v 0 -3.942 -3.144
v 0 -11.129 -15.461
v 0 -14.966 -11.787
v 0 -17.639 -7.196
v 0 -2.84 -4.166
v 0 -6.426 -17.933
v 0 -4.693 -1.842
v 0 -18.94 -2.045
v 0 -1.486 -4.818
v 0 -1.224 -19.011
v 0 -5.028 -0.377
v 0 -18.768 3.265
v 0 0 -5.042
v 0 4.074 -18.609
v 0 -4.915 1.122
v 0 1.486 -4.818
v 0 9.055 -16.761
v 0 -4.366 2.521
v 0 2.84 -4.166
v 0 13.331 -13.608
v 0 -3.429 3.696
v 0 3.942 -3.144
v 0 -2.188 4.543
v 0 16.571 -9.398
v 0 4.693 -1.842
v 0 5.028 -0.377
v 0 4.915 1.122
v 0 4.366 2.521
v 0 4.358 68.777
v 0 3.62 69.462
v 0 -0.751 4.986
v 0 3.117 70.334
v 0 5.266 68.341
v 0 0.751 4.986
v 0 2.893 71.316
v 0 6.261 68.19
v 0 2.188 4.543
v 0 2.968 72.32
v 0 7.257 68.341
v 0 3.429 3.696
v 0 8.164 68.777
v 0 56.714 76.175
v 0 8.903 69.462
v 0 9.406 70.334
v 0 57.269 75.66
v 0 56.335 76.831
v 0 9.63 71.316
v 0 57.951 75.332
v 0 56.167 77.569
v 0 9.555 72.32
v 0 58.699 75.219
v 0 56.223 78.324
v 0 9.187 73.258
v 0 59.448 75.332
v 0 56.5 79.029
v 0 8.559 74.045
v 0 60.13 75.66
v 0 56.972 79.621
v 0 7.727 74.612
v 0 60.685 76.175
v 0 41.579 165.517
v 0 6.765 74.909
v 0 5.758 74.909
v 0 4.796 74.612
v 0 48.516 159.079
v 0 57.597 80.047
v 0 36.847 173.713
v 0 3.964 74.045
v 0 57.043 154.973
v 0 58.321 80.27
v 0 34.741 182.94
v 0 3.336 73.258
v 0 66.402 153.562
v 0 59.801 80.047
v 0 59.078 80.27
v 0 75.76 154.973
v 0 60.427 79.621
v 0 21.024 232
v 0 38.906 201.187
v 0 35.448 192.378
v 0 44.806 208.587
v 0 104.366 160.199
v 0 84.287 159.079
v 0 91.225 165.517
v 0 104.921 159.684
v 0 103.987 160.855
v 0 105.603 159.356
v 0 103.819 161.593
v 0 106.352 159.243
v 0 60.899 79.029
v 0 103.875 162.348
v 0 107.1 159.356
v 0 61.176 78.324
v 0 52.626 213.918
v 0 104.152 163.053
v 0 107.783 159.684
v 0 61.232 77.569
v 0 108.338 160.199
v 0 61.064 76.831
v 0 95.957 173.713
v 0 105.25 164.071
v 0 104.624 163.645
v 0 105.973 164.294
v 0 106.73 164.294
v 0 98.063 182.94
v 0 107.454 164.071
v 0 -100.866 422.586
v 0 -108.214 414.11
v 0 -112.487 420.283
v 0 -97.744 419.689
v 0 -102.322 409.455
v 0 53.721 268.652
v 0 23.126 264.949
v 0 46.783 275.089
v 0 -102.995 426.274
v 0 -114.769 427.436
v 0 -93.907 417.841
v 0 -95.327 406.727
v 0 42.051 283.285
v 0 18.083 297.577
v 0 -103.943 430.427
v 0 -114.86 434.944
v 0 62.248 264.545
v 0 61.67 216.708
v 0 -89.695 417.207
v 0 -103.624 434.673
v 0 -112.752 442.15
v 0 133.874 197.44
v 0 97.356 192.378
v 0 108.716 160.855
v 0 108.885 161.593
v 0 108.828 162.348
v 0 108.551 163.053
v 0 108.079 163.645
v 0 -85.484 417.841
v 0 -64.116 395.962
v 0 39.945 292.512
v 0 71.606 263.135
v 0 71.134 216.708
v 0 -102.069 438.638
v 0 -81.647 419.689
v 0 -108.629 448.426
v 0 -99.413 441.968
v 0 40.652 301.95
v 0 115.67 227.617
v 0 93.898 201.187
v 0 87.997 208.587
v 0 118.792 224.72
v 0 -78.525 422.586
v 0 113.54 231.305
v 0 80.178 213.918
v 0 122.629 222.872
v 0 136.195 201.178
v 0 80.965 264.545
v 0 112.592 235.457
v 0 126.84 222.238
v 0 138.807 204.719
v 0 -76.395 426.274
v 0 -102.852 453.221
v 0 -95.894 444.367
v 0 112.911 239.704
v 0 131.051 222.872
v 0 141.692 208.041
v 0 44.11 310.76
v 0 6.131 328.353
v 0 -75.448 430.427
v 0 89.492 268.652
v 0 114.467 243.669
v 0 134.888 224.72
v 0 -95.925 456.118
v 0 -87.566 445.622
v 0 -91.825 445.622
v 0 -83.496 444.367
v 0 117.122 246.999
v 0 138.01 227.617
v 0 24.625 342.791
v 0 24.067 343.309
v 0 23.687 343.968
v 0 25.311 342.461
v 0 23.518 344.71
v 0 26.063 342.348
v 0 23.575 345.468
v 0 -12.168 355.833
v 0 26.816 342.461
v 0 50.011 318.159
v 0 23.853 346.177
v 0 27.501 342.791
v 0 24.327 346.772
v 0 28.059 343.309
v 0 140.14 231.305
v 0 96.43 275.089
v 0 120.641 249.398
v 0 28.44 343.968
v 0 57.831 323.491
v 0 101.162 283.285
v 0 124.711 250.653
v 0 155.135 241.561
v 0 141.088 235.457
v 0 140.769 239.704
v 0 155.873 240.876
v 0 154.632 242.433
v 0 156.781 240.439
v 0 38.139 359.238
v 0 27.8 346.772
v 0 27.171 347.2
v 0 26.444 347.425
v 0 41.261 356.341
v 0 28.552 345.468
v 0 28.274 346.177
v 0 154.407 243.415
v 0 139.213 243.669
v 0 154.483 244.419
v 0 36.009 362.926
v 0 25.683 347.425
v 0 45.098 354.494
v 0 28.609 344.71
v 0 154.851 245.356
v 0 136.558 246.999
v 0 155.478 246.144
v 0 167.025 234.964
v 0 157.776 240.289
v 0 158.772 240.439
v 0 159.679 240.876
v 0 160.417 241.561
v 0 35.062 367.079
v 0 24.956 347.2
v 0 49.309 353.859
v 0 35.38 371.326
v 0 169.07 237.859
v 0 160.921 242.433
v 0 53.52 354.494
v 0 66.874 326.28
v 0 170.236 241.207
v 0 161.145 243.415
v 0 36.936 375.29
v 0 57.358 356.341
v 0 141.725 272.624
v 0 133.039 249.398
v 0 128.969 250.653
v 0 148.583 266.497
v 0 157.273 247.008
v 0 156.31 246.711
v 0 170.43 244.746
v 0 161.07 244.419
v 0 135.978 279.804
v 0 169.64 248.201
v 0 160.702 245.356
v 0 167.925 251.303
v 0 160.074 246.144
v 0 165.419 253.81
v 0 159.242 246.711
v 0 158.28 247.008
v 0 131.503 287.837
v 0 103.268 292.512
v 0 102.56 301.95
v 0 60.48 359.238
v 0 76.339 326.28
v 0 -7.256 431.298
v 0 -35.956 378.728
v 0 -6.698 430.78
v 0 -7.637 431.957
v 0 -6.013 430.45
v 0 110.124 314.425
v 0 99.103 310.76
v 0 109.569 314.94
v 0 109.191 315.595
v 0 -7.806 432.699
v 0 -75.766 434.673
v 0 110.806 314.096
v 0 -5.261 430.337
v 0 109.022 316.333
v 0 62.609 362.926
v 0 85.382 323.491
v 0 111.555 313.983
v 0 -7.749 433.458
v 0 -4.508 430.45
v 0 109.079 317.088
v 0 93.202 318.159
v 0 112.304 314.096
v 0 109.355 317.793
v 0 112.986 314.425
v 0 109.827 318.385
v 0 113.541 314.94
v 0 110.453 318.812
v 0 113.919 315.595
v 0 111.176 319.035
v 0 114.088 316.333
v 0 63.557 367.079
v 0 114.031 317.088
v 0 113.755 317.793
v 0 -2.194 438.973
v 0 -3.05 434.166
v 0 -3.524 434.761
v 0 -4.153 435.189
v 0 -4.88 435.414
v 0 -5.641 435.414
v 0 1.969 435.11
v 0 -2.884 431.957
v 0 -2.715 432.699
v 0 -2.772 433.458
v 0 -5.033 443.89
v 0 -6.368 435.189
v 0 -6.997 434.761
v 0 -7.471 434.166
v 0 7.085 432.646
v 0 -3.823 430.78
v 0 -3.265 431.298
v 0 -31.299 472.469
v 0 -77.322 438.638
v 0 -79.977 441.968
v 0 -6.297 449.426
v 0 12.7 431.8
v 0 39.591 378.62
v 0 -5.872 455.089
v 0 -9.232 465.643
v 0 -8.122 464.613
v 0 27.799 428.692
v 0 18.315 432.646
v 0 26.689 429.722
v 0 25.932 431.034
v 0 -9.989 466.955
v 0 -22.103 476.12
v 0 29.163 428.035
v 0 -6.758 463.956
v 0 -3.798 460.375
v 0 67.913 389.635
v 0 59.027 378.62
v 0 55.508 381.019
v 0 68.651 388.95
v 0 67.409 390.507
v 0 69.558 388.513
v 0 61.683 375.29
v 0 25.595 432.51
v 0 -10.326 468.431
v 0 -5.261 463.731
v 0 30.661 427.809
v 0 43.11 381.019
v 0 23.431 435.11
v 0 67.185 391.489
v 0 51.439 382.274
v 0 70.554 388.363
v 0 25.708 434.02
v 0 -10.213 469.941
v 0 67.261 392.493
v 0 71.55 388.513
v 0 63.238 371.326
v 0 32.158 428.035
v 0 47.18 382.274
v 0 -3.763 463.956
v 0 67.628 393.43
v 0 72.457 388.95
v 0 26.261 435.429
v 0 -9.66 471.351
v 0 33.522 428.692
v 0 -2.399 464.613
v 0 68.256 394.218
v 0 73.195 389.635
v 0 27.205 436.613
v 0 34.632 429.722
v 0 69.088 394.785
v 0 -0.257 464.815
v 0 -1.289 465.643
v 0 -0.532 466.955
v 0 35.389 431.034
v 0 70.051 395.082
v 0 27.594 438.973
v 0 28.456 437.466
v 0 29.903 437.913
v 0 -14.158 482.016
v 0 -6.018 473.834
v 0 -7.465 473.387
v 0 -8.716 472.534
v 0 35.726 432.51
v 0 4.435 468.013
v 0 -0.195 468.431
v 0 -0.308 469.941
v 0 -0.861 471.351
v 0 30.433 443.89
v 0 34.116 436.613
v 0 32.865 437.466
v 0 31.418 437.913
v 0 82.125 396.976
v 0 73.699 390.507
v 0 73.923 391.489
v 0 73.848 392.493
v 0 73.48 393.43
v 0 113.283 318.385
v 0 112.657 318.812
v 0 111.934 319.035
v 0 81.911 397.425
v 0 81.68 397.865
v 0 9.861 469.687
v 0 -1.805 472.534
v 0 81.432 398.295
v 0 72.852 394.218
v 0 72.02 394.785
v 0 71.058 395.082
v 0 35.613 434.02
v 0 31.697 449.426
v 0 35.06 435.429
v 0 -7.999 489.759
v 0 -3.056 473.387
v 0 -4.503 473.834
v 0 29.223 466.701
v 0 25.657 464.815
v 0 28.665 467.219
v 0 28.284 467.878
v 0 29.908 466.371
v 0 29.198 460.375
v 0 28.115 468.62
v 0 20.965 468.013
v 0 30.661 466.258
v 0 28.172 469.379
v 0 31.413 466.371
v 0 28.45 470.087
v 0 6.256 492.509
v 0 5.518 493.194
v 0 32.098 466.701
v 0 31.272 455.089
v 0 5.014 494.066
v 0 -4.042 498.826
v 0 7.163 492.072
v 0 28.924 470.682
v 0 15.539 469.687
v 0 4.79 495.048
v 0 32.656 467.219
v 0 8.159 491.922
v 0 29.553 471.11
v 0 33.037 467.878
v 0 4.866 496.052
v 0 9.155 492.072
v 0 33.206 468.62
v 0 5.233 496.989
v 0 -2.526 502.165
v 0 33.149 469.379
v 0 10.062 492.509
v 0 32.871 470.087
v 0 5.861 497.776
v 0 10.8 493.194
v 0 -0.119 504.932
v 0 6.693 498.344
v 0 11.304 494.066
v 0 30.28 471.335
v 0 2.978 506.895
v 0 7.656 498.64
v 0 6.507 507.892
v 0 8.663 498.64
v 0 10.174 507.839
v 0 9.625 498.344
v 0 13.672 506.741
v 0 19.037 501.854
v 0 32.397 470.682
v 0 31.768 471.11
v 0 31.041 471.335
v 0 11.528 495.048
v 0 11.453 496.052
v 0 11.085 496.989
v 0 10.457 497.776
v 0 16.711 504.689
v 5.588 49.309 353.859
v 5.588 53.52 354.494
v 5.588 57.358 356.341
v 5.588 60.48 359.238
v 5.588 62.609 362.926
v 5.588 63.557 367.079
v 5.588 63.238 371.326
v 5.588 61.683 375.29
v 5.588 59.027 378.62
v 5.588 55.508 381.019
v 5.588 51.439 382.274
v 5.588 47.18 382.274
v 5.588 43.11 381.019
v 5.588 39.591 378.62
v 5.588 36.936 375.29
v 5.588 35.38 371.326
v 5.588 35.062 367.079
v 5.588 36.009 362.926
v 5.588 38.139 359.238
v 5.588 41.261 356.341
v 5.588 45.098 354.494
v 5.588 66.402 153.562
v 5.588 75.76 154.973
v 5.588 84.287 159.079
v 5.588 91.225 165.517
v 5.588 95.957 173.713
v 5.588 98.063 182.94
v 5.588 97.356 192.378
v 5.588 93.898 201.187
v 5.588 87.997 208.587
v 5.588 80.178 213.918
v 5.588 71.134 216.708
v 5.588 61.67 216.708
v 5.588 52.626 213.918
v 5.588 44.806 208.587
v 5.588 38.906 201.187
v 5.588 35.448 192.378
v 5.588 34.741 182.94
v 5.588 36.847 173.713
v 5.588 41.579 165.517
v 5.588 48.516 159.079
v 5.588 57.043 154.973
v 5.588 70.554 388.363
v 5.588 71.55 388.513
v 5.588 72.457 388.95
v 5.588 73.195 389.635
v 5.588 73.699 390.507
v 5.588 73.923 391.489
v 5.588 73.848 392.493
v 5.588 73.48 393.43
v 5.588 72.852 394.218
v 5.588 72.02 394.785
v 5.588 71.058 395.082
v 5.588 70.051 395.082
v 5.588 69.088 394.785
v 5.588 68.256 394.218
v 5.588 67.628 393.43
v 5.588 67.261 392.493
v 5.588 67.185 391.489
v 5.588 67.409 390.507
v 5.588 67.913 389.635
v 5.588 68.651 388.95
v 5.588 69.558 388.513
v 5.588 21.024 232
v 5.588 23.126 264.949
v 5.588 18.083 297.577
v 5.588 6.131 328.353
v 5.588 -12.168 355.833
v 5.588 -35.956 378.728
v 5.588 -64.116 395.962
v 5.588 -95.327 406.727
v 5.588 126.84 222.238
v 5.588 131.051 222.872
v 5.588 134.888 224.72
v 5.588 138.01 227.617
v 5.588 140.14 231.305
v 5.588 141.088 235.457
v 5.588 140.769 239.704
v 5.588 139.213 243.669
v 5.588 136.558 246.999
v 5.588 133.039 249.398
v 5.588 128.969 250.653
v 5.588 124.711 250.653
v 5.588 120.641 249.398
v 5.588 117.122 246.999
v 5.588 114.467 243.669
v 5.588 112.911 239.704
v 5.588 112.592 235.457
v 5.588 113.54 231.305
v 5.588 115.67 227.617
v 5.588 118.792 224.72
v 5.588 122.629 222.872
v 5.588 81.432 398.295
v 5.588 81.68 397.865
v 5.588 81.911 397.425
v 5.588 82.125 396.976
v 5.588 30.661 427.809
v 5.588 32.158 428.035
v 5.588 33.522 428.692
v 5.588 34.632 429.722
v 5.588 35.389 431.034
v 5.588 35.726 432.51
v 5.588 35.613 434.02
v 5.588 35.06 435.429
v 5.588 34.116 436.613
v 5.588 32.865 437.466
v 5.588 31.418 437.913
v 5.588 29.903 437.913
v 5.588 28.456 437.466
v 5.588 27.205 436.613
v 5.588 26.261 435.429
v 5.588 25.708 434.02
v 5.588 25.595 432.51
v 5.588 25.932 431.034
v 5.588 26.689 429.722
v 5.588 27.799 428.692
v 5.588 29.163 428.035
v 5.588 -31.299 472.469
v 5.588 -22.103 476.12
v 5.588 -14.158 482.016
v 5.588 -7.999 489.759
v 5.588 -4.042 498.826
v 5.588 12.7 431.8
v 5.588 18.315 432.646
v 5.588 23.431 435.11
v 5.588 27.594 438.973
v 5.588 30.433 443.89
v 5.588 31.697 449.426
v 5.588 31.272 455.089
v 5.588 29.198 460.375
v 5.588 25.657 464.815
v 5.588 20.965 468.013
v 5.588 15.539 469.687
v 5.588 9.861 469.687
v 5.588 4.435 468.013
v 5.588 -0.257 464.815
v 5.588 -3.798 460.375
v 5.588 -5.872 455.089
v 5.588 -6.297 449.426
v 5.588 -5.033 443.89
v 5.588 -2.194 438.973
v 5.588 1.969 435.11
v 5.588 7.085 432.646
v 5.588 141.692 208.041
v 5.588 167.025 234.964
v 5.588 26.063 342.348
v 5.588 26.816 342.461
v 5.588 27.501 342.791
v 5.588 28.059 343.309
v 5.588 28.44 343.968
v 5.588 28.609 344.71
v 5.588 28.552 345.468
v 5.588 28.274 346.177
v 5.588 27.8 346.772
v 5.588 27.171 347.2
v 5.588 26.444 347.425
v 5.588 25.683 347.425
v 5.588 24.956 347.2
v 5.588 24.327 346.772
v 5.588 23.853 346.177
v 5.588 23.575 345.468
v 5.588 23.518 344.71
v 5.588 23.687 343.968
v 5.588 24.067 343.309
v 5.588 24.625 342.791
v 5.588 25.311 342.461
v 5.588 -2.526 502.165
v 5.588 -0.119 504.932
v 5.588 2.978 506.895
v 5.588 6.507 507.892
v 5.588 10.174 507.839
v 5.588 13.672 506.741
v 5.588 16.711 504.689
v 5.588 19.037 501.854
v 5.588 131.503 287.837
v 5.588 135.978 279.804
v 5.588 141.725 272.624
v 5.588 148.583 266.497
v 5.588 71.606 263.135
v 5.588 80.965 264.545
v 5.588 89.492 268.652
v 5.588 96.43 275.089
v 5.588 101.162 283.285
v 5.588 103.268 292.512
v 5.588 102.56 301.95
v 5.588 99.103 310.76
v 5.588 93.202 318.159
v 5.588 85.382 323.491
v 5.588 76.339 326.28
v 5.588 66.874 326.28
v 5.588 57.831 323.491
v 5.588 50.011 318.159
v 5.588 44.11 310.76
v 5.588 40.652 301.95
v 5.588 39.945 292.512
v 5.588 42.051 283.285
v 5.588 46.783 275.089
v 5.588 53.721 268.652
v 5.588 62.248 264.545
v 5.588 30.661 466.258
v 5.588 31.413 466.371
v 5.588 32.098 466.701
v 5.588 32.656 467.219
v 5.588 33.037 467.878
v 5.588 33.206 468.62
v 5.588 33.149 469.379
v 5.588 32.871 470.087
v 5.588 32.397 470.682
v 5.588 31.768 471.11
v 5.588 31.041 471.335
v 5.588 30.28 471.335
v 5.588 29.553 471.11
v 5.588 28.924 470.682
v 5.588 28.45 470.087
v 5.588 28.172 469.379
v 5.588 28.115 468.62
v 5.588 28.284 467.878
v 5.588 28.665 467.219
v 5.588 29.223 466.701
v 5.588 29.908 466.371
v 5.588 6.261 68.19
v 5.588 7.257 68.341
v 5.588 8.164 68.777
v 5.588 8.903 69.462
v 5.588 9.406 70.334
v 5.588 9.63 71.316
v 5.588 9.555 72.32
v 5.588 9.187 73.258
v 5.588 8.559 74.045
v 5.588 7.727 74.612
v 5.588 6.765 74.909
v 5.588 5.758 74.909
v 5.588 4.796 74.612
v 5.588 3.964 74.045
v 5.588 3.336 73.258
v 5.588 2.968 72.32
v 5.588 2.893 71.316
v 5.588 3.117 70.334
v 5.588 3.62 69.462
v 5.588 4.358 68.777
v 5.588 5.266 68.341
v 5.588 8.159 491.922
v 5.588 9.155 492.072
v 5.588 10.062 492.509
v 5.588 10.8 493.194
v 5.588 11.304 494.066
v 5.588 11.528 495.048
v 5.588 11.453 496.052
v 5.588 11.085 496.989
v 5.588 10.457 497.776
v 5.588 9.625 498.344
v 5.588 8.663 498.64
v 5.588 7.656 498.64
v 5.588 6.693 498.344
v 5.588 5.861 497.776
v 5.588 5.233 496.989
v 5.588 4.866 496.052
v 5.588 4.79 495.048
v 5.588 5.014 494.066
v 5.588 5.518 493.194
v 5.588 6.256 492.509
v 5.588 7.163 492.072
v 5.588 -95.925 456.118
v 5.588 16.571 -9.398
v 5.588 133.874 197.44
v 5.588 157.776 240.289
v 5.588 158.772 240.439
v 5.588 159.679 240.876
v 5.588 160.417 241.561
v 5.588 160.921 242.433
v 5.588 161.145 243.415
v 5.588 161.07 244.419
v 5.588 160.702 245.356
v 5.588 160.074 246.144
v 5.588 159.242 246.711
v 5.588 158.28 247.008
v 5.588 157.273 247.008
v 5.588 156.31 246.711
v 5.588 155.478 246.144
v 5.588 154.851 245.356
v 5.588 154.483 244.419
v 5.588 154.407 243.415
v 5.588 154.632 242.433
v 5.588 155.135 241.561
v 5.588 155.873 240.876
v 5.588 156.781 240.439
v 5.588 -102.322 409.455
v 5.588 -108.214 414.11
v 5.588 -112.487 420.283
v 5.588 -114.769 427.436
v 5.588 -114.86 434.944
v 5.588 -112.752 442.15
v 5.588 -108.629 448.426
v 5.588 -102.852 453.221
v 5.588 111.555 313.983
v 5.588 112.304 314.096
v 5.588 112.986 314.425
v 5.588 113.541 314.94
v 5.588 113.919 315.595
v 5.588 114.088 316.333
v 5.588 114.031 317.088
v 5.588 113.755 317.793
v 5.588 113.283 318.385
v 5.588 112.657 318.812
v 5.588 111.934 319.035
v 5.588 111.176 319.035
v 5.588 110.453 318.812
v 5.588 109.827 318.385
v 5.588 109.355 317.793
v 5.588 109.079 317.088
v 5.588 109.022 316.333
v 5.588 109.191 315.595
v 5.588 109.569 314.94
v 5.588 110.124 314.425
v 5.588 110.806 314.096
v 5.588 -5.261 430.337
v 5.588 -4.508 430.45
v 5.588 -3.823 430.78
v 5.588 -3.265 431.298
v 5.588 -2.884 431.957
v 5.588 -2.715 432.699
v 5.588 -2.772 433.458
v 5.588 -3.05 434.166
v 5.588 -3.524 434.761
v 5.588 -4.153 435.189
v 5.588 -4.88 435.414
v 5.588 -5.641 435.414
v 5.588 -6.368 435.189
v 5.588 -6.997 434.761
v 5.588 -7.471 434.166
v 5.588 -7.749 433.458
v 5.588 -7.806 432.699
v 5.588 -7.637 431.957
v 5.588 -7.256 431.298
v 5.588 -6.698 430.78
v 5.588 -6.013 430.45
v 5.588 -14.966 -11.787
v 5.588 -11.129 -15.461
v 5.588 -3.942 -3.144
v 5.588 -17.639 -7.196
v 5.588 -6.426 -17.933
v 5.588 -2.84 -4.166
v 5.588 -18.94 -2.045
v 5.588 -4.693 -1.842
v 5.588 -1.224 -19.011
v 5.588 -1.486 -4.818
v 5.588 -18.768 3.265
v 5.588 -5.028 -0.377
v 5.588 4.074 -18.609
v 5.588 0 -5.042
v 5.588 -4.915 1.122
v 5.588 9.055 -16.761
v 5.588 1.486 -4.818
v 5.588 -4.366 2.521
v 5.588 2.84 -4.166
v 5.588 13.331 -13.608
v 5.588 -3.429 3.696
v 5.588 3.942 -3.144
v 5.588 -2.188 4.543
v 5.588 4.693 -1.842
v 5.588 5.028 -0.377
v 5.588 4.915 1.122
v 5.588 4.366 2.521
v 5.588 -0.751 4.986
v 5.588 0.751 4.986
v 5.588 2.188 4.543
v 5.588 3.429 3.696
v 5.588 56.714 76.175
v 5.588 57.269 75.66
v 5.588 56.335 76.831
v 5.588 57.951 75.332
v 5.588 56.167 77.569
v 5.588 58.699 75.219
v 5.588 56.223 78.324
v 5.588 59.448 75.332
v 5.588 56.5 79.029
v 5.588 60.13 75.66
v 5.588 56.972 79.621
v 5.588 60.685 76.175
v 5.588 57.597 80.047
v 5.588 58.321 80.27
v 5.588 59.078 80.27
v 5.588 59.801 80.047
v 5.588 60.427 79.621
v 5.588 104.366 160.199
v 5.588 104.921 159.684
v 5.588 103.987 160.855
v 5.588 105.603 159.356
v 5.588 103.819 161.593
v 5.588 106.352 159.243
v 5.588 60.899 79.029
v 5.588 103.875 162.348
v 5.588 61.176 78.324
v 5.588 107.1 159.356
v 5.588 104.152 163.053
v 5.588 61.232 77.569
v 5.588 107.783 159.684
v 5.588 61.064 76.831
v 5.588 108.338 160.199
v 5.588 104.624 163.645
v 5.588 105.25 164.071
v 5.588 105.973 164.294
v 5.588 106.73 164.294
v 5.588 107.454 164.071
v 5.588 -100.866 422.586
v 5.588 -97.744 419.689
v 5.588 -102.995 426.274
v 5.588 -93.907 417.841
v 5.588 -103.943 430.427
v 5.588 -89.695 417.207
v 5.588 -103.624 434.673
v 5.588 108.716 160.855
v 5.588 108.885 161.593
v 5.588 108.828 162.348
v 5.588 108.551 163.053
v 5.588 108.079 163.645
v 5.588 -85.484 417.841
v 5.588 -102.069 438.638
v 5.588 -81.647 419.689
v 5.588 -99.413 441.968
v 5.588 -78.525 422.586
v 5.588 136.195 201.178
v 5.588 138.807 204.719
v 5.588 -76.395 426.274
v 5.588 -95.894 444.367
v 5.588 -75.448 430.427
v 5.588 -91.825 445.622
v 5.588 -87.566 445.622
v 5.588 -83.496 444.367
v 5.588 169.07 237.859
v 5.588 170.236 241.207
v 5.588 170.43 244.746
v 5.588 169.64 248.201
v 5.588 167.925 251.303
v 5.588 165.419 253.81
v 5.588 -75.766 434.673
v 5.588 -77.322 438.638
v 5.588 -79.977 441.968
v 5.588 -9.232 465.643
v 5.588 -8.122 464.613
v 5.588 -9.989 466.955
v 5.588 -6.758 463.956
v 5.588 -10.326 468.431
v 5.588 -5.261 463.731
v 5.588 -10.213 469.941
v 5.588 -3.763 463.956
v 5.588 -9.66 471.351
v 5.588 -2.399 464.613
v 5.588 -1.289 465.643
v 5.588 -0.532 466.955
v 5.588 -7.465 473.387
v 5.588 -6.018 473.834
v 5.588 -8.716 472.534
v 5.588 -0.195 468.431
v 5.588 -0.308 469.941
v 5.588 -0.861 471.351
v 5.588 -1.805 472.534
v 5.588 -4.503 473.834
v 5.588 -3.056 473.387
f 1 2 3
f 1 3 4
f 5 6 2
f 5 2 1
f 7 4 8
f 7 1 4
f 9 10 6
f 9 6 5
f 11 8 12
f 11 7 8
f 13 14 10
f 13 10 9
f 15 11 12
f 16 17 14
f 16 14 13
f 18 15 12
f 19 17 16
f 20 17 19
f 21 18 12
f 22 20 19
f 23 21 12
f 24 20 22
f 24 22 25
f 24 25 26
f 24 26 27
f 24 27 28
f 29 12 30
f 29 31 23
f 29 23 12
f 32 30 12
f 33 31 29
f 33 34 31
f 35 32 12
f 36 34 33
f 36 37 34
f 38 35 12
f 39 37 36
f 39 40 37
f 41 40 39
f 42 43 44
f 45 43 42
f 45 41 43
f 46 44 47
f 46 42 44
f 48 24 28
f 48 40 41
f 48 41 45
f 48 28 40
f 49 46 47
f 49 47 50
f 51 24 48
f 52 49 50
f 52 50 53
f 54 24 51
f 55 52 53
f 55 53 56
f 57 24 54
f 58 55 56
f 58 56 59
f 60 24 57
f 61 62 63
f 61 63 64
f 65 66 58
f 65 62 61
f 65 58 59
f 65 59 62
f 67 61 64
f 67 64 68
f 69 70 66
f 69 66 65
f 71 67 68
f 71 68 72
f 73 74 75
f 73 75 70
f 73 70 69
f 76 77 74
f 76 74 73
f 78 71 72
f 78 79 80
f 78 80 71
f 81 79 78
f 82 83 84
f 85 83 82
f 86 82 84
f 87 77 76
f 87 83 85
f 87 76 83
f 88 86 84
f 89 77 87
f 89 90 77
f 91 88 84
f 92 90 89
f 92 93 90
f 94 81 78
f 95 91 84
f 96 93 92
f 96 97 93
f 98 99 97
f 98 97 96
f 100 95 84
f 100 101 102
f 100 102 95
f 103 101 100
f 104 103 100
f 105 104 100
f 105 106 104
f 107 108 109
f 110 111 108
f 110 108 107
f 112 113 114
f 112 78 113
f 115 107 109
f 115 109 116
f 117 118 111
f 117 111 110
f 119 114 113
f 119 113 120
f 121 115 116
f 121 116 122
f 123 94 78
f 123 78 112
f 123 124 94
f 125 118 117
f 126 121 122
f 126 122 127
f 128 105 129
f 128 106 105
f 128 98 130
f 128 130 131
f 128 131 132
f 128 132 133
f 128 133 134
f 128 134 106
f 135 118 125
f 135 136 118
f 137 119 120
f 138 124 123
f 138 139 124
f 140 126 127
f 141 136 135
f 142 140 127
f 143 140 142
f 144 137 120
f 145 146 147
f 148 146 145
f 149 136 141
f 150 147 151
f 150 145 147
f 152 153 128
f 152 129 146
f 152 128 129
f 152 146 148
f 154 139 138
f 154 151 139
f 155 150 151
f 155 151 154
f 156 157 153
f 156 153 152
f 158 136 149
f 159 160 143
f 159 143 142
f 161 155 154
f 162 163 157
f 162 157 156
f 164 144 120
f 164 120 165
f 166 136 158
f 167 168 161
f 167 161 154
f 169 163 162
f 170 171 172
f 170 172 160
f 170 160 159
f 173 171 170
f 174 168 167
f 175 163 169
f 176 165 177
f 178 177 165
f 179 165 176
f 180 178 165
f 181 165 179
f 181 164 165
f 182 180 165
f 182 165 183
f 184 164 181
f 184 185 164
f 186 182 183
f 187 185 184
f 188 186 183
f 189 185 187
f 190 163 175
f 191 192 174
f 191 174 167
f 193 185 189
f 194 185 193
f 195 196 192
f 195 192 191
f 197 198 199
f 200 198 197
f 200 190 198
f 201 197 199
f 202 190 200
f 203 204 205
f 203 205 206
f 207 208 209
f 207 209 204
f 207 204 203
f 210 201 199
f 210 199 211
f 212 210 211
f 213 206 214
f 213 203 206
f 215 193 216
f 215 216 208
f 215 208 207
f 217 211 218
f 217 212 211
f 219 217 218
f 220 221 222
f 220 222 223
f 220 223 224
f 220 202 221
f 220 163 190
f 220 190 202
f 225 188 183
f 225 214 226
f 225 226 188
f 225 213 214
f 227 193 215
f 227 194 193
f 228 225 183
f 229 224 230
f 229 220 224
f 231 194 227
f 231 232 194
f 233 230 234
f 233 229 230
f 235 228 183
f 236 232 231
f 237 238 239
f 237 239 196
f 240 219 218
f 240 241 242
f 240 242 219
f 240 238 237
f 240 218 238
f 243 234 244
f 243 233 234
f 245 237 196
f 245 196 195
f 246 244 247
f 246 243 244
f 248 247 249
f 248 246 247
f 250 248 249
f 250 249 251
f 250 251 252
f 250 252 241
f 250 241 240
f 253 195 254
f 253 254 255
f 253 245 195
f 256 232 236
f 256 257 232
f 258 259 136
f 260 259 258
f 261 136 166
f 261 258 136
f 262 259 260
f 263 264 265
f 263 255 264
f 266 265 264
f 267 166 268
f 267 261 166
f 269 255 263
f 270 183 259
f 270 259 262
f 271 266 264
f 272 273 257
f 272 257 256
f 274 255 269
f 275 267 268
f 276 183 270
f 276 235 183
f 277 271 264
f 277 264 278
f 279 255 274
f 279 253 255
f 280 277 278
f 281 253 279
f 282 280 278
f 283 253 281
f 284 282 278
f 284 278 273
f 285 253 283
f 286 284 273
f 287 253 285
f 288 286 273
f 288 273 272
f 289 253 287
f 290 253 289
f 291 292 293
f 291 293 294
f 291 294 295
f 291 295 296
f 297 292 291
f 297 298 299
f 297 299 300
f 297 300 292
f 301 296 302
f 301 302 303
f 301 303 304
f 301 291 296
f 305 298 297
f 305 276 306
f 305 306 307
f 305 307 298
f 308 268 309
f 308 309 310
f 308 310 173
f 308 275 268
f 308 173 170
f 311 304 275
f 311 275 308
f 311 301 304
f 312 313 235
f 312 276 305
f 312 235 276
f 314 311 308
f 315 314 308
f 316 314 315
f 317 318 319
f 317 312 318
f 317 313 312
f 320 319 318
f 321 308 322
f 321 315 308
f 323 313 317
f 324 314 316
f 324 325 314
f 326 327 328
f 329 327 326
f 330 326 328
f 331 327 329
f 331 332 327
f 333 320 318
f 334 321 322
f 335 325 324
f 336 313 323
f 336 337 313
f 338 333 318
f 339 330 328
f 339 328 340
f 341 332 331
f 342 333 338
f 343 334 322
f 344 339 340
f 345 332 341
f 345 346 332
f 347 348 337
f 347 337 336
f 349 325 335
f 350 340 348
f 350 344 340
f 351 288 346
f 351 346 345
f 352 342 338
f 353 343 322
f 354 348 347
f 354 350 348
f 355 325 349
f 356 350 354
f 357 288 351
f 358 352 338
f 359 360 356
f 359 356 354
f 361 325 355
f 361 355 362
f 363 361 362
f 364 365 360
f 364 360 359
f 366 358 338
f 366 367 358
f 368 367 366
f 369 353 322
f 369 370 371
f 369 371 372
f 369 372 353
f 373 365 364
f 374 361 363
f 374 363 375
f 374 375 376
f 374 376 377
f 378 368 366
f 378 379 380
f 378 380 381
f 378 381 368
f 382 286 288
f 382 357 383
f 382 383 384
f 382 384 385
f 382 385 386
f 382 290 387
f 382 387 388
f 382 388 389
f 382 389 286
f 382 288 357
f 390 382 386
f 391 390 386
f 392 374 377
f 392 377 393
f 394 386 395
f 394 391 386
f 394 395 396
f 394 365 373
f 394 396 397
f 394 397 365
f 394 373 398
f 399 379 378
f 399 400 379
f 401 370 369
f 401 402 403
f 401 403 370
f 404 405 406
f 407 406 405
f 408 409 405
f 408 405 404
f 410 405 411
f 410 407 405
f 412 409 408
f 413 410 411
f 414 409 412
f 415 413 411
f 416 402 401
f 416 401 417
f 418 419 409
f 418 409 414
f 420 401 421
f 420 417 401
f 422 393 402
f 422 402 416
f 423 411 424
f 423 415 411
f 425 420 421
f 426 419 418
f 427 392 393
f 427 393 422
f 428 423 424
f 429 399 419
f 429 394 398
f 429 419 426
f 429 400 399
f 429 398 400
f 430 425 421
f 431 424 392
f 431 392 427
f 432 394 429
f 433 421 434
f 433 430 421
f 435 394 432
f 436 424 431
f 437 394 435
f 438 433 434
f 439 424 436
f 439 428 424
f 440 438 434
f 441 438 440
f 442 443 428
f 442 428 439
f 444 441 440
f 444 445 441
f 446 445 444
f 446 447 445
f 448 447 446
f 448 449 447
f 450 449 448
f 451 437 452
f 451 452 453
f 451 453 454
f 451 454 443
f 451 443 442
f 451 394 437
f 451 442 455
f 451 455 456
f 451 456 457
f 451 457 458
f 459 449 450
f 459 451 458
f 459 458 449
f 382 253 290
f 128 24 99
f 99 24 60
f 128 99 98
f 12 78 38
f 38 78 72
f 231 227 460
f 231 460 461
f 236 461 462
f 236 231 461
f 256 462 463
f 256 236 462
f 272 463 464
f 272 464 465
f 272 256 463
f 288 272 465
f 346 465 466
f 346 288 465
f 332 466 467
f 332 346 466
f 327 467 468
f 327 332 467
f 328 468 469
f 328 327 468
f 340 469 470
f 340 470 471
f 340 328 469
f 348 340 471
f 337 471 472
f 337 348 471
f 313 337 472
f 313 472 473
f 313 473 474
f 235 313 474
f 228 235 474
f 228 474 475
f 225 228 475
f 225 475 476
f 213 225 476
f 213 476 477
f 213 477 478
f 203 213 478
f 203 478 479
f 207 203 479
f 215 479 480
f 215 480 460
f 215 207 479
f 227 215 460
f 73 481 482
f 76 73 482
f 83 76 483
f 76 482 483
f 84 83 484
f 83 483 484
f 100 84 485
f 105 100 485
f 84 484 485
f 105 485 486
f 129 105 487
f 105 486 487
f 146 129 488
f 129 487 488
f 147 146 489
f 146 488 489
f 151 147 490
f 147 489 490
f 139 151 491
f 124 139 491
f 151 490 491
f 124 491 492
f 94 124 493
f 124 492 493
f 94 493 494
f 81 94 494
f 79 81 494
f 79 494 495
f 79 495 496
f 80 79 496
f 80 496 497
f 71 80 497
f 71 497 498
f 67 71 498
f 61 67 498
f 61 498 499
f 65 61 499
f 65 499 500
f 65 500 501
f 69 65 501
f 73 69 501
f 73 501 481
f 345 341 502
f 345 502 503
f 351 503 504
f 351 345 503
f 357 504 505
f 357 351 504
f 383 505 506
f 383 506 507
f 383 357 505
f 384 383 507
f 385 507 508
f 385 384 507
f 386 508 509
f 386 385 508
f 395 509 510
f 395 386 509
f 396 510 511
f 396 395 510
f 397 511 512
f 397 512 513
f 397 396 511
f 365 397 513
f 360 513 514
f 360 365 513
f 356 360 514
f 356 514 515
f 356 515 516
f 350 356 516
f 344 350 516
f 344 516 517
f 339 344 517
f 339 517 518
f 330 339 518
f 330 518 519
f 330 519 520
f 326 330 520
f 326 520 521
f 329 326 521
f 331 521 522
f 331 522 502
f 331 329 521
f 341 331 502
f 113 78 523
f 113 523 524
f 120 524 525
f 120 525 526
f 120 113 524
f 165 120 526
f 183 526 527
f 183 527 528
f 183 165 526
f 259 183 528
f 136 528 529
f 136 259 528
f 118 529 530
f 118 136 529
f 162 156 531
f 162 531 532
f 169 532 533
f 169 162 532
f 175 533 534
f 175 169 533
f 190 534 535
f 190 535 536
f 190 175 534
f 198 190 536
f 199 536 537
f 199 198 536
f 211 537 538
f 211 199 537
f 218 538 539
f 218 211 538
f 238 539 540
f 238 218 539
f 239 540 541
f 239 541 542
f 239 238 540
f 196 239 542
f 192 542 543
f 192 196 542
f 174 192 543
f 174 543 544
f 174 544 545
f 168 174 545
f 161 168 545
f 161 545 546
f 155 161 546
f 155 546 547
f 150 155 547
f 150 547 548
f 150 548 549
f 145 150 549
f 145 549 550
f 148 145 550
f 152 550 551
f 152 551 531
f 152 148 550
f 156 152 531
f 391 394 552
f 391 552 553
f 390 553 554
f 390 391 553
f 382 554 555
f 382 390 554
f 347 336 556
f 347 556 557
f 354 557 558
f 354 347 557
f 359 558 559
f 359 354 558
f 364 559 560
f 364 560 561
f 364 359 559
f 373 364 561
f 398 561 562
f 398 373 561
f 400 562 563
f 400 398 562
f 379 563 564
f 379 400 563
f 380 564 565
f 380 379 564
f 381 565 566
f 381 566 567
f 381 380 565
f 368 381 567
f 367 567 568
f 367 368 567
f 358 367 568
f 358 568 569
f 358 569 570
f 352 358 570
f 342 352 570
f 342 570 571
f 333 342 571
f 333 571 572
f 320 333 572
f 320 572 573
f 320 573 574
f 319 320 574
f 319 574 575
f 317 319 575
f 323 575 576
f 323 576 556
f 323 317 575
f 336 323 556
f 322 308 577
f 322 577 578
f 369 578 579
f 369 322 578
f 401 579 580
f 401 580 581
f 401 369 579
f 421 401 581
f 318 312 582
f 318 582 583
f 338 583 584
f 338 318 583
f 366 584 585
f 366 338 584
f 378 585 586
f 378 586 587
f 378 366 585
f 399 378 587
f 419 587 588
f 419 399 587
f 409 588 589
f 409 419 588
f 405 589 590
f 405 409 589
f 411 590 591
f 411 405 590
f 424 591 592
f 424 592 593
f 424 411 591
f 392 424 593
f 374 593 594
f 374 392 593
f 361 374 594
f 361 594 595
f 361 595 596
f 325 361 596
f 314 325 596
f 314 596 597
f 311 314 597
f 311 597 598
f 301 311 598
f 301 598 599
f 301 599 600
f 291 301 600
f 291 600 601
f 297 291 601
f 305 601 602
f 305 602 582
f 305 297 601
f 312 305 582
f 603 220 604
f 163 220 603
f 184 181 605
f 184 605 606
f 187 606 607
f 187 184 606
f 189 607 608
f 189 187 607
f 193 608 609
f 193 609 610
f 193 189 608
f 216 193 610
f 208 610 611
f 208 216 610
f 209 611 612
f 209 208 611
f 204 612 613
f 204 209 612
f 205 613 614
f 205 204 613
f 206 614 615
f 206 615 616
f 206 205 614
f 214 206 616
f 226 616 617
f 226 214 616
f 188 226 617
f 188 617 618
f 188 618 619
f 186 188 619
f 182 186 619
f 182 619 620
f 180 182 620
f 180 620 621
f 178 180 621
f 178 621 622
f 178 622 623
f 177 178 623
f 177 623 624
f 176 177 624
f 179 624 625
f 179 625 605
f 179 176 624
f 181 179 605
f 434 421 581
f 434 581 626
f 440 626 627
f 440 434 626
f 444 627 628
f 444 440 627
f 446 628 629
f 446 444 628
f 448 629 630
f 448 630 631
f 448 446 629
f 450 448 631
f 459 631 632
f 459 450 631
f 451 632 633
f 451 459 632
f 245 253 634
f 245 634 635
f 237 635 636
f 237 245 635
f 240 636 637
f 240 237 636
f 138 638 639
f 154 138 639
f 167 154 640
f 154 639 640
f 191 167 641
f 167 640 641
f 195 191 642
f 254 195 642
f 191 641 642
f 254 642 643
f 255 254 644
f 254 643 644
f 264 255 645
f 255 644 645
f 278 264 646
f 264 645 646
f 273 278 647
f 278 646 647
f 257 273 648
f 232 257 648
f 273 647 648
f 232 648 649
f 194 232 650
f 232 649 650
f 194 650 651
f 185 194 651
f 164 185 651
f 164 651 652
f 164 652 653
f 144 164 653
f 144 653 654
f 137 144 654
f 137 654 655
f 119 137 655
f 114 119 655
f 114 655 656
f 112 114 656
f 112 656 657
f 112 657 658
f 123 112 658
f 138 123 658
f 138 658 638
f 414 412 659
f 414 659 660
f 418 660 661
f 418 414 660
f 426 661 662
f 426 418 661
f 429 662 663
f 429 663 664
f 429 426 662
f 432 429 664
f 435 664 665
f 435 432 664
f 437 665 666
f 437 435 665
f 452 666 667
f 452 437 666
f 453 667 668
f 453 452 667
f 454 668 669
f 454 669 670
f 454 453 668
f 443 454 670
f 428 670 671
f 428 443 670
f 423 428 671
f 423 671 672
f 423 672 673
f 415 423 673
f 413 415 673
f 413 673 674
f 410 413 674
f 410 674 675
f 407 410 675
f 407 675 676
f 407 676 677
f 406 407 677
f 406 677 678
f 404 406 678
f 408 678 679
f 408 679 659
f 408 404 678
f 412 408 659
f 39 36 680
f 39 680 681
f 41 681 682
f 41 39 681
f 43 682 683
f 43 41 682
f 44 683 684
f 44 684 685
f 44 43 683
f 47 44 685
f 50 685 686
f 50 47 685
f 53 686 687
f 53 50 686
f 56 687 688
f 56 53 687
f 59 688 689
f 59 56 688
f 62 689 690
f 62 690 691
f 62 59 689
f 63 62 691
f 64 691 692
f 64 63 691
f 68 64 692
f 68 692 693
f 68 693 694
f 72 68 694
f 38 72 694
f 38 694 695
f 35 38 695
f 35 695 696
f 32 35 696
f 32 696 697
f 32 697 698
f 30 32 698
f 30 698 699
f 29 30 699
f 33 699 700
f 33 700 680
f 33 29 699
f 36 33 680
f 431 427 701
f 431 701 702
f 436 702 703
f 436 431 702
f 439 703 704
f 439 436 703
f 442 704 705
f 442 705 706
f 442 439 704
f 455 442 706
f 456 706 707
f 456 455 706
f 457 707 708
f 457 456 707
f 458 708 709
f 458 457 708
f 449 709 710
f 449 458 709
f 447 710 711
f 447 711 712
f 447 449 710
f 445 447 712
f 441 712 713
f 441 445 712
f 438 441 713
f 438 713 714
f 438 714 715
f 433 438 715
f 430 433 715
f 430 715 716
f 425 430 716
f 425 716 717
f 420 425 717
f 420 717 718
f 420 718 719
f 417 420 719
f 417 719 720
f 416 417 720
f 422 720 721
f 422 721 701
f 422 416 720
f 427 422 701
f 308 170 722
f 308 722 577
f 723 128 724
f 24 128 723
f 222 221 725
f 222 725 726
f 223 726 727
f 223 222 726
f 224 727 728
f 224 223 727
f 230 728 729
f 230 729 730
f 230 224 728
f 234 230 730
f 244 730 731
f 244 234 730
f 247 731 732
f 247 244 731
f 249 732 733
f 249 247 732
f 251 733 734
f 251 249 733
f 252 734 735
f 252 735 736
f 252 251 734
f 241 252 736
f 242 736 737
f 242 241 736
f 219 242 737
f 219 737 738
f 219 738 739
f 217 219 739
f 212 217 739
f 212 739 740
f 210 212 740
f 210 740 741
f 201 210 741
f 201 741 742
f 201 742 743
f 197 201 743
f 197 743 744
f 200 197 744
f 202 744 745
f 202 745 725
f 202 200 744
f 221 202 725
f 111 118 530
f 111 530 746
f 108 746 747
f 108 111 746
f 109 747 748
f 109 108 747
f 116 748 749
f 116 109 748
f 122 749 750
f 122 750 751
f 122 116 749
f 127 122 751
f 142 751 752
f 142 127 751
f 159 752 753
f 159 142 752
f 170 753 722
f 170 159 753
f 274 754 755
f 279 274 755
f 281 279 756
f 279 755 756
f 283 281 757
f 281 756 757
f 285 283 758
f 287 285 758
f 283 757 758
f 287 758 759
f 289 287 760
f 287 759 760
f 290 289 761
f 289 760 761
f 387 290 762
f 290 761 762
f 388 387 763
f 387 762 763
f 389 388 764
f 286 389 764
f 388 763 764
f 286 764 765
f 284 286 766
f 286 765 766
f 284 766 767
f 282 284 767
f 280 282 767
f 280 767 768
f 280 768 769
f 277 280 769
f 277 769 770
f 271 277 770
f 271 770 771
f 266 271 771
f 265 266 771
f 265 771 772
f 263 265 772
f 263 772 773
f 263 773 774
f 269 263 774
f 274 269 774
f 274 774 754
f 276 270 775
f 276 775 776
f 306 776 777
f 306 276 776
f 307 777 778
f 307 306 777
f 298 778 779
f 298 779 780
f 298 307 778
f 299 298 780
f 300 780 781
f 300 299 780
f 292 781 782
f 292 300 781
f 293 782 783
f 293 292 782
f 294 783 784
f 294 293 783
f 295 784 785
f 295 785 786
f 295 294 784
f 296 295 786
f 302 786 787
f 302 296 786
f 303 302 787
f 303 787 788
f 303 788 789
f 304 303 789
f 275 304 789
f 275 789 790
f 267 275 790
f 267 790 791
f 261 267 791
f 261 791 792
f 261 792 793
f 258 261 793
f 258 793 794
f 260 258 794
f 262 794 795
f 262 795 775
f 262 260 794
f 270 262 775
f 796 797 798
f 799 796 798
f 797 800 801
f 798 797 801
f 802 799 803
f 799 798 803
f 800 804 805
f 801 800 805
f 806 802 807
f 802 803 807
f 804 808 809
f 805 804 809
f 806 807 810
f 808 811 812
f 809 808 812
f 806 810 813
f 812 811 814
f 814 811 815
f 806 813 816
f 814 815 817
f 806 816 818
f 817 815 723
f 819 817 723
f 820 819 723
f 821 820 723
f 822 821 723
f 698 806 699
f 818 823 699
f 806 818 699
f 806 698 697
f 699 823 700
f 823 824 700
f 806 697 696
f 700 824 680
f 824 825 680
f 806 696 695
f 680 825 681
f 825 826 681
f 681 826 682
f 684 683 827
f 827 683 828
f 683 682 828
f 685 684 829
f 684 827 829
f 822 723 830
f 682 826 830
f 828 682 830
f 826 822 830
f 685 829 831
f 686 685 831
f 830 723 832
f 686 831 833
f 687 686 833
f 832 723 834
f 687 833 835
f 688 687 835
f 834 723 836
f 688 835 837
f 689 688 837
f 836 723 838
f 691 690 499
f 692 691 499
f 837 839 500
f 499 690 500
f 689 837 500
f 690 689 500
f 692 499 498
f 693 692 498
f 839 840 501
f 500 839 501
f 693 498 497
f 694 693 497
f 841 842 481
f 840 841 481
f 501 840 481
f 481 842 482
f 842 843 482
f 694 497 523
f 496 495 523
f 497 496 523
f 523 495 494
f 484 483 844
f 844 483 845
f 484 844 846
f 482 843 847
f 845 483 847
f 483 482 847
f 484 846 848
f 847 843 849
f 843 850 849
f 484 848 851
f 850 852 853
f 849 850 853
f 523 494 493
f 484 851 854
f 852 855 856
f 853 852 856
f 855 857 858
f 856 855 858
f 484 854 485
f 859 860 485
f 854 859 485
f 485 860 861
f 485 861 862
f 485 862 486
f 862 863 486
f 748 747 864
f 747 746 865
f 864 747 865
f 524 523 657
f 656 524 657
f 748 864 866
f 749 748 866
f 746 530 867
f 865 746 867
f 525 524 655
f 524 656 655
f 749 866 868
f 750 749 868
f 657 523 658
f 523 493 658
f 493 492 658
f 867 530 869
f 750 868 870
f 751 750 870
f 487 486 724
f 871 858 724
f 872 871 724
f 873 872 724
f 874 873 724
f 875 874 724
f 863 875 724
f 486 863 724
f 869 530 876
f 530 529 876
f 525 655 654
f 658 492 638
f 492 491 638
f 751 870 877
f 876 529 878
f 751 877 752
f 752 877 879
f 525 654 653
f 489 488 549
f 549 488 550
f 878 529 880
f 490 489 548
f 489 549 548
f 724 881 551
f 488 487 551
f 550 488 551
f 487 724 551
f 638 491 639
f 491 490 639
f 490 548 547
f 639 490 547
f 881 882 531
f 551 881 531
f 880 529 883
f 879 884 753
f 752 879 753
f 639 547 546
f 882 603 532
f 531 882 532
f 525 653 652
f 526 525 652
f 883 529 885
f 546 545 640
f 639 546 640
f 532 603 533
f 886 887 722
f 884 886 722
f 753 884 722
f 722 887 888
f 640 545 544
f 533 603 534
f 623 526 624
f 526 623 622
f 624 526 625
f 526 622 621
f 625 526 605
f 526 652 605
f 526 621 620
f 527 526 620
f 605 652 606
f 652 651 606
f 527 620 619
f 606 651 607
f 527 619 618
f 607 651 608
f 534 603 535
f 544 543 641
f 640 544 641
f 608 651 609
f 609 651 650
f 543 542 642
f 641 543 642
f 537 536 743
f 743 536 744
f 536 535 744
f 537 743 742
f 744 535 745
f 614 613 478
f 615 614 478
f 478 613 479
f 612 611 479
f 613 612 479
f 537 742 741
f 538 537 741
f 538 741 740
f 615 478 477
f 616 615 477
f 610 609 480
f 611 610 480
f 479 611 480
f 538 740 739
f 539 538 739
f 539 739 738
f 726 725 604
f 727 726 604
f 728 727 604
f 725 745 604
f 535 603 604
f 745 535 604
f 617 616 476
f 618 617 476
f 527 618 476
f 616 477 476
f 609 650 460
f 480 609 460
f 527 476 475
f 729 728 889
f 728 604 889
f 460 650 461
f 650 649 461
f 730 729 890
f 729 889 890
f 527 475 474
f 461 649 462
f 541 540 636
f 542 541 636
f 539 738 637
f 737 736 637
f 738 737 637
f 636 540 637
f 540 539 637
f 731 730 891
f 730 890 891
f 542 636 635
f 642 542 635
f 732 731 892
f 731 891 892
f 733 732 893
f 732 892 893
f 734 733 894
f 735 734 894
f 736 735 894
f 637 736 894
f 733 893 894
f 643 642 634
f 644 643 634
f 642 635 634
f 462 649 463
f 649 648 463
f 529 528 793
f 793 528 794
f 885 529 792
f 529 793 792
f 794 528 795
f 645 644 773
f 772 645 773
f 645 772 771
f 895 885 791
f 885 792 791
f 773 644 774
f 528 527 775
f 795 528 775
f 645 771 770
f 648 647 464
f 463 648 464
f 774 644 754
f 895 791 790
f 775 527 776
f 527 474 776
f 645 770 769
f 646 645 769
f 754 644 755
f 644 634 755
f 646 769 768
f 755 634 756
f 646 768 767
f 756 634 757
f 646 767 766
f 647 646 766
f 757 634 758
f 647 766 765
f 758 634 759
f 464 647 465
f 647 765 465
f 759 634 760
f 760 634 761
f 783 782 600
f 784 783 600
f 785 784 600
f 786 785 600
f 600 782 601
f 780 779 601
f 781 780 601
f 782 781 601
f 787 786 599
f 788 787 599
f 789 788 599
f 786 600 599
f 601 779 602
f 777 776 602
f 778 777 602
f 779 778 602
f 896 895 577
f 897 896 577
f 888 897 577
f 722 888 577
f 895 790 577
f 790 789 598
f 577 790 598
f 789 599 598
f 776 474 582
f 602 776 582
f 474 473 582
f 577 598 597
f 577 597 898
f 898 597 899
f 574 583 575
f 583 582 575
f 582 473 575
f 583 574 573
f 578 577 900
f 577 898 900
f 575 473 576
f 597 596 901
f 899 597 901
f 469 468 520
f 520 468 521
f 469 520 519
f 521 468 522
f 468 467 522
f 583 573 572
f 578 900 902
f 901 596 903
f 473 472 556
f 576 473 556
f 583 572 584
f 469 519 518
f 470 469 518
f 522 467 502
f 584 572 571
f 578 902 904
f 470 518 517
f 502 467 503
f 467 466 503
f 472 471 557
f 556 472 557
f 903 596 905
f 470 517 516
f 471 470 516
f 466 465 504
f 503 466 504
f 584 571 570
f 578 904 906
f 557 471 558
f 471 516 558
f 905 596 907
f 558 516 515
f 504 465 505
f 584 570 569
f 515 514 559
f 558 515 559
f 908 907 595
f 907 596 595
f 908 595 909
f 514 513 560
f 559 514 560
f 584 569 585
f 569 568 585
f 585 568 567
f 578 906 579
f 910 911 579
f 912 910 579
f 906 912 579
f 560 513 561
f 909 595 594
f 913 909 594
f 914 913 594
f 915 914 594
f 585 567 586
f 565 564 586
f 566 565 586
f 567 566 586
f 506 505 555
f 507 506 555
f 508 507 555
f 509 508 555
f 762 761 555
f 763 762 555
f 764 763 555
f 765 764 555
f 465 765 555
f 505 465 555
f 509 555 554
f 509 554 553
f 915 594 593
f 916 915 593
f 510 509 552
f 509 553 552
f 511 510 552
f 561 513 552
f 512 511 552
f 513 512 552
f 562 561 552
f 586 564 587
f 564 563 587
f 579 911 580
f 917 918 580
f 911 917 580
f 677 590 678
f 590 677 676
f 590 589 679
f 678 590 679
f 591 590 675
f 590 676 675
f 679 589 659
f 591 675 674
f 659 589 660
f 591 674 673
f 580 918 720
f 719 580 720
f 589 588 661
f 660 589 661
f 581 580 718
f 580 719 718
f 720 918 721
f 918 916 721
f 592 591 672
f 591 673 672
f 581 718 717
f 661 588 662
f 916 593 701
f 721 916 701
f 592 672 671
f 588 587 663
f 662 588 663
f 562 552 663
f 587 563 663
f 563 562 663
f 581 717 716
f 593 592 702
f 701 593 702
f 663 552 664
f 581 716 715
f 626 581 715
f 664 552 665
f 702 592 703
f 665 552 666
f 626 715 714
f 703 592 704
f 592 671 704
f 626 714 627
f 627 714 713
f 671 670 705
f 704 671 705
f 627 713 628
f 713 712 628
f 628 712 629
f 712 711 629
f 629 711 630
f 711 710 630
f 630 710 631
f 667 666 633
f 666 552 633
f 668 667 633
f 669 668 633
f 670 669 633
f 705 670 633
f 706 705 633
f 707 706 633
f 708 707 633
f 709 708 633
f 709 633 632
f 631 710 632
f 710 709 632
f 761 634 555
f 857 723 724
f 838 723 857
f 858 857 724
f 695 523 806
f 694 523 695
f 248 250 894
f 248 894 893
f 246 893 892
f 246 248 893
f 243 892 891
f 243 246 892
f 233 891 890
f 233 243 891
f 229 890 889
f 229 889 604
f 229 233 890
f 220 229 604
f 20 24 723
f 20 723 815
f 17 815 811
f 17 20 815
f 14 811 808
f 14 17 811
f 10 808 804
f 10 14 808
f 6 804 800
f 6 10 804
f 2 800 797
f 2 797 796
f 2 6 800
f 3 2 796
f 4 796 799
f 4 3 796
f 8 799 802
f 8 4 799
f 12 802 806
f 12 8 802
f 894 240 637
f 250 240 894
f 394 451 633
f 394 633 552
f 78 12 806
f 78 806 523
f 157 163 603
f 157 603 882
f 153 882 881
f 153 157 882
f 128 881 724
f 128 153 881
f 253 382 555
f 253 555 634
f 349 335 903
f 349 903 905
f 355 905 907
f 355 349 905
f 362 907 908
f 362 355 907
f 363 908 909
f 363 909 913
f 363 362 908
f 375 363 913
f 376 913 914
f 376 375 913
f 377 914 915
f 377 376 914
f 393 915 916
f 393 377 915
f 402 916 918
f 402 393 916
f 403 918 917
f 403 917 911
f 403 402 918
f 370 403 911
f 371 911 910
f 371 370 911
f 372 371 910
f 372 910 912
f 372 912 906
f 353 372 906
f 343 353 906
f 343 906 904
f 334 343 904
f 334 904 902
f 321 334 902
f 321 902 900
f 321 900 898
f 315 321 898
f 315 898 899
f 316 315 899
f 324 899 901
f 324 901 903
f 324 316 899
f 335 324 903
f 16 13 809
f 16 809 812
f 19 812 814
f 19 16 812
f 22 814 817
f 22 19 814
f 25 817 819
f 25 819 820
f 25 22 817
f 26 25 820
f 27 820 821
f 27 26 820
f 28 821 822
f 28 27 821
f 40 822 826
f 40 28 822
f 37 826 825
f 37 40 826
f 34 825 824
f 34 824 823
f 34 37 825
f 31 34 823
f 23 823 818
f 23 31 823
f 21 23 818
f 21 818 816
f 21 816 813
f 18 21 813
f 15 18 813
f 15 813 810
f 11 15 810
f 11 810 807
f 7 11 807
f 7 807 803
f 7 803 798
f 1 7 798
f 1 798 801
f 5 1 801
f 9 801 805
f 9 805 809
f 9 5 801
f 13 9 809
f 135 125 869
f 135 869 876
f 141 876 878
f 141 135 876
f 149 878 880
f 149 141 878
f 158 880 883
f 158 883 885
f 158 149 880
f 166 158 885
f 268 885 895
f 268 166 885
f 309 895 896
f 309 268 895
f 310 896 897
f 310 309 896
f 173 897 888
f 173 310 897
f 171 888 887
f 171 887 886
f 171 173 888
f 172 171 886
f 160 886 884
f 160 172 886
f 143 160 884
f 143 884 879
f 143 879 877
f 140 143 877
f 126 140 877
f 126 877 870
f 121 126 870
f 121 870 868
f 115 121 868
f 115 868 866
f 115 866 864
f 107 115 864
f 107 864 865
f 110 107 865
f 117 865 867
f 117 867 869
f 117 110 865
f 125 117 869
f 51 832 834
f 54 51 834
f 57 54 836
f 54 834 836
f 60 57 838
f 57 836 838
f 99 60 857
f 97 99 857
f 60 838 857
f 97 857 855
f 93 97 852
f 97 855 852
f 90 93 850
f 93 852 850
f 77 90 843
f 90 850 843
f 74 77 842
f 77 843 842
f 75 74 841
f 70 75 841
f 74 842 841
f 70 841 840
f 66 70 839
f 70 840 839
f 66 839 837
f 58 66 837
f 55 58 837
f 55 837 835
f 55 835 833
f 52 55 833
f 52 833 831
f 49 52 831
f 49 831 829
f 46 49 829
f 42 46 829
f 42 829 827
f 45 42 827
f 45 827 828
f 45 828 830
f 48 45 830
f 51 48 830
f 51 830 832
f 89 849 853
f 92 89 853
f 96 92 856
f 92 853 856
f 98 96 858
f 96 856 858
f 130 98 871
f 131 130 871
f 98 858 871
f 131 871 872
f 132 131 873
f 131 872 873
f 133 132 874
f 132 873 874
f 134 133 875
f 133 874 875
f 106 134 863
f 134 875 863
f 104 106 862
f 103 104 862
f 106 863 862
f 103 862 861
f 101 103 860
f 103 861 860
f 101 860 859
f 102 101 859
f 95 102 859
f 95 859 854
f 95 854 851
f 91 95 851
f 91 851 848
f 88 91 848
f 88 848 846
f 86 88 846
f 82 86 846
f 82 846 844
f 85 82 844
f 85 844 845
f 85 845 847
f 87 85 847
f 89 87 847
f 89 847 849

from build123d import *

# Parameters (mm, degrees)
SKETCH2_R           = 14.2875
SKETCH2_R_2         = 19.05
SKETCH2_R_3         = 2.5527
SKETCH2_R_4         = 5.0419
SKETCH2_R_5         = 3.3782
SKETCH2_R_6         = 5.08
BOSS_EXTRUDE1_DEPTH = 5.588
SKETCH4_R           = 31.75
SKETCH4_R_2         = 2.54
CUT_EXTRUDE1_DEPTH  = 6.588


with BuildPart() as part:
    # Sketch2 → Boss-Extrude1 (new body)
    with BuildSketch(Plane(origin=(0, 0, 0), x_dir=(0, 0, -1), z_dir=(1, 0, 0))):
        with BuildLine():
            Line((-456.118369633, -95.925064686), (-472.468769944, -31.298651711))
            ThreePointArc((-472.468769944, -31.298651711), (-482.016027605, -14.158478394), (-498.826247655, -4.041553364))
            ThreePointArc((-498.826247655, -4.041553364), (-507.892088549, 6.507023908), (-501.854140922, 19.037193183))
            Line((-501.854140922, 19.037193183), (-398.295274803, 81.43217891))
            ThreePointArc((-398.295274803, 81.43217891), (-397.645900343, 81.797901654), (-396.976191421, 82.124903604))
            Line((-396.976191421, 82.124903604), (-287.837435211, 131.503170214))
            ThreePointArc((-287.837435211, 131.503170214), (-276.093947879, 138.70177912), (-266.497227284, 148.582690958))
            Line((-266.497227284, 148.582690958), (-253.809934756, 165.419296806))
            ThreePointArc((-253.809934756, 165.419296806), (-244.745753976, 170.430370198), (-234.964294435, 167.025479743))
            Line((-234.964294435, 167.025479743), (-208.040592879, 141.691905515))
            ThreePointArc((-208.040592879, 141.691905515), (-202.97415121, 137.465830921), (-197.439882679, 133.87411692))
            Line((-197.439882679, 133.87411692), (9.397681692, 16.570639059))
            ThreePointArc((9.397681692, 16.570639059), (17.93346767, -6.425981428), (-3.265021391, -18.768114858))
            Line((-3.265021391, -18.768114858), (-232.00028645, 21.024135937))
            ThreePointArc((-232.00028645, 21.024135937), (-342.59010045, -2.271898683), (-406.726541812, -95.327414797))
            ThreePointArc((-406.726541812, -95.327414797), (-431.186900503, -115.093327518), (-456.118369633, -95.925064686))
        make_face()
        with Locations((-236.525067803, 126.839996455)):
            Circle(SKETCH2_R, mode=Mode.SUBTRACT)
        with Locations((-368.146285671, 49.309174015)):
            Circle(SKETCH2_R, mode=Mode.SUBTRACT)
        with Locations((-431.494222517, -89.695186775)):
            Circle(SKETCH2_R, mode=Mode.SUBTRACT)
        with Locations((-450.85, 12.7)):
            Circle(SKETCH2_R_2, mode=Mode.SUBTRACT)
        with Locations((-344.900370281, 26.063258625)):
            Circle(SKETCH2_R_3, mode=Mode.SUBTRACT)
        Circle(SKETCH2_R_4, mode=Mode.SUBTRACT)
        with Locations((-71.568668283, 6.261447138)):
            Circle(SKETCH2_R_5, mode=Mode.SUBTRACT)
        with Locations((-391.74113388, 70.554070767)):
            Circle(SKETCH2_R_5, mode=Mode.SUBTRACT)
        with Locations((-243.667263779, 157.776246012)):
            Circle(SKETCH2_R_5, mode=Mode.SUBTRACT)
        with Locations((-432.889487758, 30.660512242)):
            Circle(SKETCH2_R_6, mode=Mode.SUBTRACT)
        with Locations((-468.810512242, 30.660512242)):
            Circle(SKETCH2_R_3, mode=Mode.SUBTRACT)
        with Locations((-468.810512242, -5.260512242)):
            Circle(SKETCH2_R_6, mode=Mode.SUBTRACT)
        with Locations((-432.889487758, -5.260512242)):
            Circle(SKETCH2_R_3, mode=Mode.SUBTRACT)
        with Locations((-495.3, 8.15908504)):
            Circle(SKETCH2_R_5, mode=Mode.SUBTRACT)
    extrude(amount=BOSS_EXTRUDE1_DEPTH)

    # Sketch4 → Cut-Extrude1 (cut, through all)
    with BuildSketch(Plane(origin=(5.588, 0, 0), x_dir=(0, 0, -1), z_dir=(1, 0, 0))):
        with Locations((-294.8848929, 71.606423498)):
            Circle(SKETCH4_R)
        with Locations((-185.31249926, 66.401808093)):
            Circle(SKETCH4_R)
        with Locations((-316.523268338, 111.55499619)):
            Circle(SKETCH4_R_2)
        with Locations((-161.782656077, 106.351776712)):
            Circle(SKETCH4_R_2)
        with Locations((-77.758767474, 58.699434709)):
            Circle(SKETCH4_R_2)
    extrude(amount=-CUT_EXTRUDE1_DEPTH, mode=Mode.SUBTRACT)


solid = part.part
